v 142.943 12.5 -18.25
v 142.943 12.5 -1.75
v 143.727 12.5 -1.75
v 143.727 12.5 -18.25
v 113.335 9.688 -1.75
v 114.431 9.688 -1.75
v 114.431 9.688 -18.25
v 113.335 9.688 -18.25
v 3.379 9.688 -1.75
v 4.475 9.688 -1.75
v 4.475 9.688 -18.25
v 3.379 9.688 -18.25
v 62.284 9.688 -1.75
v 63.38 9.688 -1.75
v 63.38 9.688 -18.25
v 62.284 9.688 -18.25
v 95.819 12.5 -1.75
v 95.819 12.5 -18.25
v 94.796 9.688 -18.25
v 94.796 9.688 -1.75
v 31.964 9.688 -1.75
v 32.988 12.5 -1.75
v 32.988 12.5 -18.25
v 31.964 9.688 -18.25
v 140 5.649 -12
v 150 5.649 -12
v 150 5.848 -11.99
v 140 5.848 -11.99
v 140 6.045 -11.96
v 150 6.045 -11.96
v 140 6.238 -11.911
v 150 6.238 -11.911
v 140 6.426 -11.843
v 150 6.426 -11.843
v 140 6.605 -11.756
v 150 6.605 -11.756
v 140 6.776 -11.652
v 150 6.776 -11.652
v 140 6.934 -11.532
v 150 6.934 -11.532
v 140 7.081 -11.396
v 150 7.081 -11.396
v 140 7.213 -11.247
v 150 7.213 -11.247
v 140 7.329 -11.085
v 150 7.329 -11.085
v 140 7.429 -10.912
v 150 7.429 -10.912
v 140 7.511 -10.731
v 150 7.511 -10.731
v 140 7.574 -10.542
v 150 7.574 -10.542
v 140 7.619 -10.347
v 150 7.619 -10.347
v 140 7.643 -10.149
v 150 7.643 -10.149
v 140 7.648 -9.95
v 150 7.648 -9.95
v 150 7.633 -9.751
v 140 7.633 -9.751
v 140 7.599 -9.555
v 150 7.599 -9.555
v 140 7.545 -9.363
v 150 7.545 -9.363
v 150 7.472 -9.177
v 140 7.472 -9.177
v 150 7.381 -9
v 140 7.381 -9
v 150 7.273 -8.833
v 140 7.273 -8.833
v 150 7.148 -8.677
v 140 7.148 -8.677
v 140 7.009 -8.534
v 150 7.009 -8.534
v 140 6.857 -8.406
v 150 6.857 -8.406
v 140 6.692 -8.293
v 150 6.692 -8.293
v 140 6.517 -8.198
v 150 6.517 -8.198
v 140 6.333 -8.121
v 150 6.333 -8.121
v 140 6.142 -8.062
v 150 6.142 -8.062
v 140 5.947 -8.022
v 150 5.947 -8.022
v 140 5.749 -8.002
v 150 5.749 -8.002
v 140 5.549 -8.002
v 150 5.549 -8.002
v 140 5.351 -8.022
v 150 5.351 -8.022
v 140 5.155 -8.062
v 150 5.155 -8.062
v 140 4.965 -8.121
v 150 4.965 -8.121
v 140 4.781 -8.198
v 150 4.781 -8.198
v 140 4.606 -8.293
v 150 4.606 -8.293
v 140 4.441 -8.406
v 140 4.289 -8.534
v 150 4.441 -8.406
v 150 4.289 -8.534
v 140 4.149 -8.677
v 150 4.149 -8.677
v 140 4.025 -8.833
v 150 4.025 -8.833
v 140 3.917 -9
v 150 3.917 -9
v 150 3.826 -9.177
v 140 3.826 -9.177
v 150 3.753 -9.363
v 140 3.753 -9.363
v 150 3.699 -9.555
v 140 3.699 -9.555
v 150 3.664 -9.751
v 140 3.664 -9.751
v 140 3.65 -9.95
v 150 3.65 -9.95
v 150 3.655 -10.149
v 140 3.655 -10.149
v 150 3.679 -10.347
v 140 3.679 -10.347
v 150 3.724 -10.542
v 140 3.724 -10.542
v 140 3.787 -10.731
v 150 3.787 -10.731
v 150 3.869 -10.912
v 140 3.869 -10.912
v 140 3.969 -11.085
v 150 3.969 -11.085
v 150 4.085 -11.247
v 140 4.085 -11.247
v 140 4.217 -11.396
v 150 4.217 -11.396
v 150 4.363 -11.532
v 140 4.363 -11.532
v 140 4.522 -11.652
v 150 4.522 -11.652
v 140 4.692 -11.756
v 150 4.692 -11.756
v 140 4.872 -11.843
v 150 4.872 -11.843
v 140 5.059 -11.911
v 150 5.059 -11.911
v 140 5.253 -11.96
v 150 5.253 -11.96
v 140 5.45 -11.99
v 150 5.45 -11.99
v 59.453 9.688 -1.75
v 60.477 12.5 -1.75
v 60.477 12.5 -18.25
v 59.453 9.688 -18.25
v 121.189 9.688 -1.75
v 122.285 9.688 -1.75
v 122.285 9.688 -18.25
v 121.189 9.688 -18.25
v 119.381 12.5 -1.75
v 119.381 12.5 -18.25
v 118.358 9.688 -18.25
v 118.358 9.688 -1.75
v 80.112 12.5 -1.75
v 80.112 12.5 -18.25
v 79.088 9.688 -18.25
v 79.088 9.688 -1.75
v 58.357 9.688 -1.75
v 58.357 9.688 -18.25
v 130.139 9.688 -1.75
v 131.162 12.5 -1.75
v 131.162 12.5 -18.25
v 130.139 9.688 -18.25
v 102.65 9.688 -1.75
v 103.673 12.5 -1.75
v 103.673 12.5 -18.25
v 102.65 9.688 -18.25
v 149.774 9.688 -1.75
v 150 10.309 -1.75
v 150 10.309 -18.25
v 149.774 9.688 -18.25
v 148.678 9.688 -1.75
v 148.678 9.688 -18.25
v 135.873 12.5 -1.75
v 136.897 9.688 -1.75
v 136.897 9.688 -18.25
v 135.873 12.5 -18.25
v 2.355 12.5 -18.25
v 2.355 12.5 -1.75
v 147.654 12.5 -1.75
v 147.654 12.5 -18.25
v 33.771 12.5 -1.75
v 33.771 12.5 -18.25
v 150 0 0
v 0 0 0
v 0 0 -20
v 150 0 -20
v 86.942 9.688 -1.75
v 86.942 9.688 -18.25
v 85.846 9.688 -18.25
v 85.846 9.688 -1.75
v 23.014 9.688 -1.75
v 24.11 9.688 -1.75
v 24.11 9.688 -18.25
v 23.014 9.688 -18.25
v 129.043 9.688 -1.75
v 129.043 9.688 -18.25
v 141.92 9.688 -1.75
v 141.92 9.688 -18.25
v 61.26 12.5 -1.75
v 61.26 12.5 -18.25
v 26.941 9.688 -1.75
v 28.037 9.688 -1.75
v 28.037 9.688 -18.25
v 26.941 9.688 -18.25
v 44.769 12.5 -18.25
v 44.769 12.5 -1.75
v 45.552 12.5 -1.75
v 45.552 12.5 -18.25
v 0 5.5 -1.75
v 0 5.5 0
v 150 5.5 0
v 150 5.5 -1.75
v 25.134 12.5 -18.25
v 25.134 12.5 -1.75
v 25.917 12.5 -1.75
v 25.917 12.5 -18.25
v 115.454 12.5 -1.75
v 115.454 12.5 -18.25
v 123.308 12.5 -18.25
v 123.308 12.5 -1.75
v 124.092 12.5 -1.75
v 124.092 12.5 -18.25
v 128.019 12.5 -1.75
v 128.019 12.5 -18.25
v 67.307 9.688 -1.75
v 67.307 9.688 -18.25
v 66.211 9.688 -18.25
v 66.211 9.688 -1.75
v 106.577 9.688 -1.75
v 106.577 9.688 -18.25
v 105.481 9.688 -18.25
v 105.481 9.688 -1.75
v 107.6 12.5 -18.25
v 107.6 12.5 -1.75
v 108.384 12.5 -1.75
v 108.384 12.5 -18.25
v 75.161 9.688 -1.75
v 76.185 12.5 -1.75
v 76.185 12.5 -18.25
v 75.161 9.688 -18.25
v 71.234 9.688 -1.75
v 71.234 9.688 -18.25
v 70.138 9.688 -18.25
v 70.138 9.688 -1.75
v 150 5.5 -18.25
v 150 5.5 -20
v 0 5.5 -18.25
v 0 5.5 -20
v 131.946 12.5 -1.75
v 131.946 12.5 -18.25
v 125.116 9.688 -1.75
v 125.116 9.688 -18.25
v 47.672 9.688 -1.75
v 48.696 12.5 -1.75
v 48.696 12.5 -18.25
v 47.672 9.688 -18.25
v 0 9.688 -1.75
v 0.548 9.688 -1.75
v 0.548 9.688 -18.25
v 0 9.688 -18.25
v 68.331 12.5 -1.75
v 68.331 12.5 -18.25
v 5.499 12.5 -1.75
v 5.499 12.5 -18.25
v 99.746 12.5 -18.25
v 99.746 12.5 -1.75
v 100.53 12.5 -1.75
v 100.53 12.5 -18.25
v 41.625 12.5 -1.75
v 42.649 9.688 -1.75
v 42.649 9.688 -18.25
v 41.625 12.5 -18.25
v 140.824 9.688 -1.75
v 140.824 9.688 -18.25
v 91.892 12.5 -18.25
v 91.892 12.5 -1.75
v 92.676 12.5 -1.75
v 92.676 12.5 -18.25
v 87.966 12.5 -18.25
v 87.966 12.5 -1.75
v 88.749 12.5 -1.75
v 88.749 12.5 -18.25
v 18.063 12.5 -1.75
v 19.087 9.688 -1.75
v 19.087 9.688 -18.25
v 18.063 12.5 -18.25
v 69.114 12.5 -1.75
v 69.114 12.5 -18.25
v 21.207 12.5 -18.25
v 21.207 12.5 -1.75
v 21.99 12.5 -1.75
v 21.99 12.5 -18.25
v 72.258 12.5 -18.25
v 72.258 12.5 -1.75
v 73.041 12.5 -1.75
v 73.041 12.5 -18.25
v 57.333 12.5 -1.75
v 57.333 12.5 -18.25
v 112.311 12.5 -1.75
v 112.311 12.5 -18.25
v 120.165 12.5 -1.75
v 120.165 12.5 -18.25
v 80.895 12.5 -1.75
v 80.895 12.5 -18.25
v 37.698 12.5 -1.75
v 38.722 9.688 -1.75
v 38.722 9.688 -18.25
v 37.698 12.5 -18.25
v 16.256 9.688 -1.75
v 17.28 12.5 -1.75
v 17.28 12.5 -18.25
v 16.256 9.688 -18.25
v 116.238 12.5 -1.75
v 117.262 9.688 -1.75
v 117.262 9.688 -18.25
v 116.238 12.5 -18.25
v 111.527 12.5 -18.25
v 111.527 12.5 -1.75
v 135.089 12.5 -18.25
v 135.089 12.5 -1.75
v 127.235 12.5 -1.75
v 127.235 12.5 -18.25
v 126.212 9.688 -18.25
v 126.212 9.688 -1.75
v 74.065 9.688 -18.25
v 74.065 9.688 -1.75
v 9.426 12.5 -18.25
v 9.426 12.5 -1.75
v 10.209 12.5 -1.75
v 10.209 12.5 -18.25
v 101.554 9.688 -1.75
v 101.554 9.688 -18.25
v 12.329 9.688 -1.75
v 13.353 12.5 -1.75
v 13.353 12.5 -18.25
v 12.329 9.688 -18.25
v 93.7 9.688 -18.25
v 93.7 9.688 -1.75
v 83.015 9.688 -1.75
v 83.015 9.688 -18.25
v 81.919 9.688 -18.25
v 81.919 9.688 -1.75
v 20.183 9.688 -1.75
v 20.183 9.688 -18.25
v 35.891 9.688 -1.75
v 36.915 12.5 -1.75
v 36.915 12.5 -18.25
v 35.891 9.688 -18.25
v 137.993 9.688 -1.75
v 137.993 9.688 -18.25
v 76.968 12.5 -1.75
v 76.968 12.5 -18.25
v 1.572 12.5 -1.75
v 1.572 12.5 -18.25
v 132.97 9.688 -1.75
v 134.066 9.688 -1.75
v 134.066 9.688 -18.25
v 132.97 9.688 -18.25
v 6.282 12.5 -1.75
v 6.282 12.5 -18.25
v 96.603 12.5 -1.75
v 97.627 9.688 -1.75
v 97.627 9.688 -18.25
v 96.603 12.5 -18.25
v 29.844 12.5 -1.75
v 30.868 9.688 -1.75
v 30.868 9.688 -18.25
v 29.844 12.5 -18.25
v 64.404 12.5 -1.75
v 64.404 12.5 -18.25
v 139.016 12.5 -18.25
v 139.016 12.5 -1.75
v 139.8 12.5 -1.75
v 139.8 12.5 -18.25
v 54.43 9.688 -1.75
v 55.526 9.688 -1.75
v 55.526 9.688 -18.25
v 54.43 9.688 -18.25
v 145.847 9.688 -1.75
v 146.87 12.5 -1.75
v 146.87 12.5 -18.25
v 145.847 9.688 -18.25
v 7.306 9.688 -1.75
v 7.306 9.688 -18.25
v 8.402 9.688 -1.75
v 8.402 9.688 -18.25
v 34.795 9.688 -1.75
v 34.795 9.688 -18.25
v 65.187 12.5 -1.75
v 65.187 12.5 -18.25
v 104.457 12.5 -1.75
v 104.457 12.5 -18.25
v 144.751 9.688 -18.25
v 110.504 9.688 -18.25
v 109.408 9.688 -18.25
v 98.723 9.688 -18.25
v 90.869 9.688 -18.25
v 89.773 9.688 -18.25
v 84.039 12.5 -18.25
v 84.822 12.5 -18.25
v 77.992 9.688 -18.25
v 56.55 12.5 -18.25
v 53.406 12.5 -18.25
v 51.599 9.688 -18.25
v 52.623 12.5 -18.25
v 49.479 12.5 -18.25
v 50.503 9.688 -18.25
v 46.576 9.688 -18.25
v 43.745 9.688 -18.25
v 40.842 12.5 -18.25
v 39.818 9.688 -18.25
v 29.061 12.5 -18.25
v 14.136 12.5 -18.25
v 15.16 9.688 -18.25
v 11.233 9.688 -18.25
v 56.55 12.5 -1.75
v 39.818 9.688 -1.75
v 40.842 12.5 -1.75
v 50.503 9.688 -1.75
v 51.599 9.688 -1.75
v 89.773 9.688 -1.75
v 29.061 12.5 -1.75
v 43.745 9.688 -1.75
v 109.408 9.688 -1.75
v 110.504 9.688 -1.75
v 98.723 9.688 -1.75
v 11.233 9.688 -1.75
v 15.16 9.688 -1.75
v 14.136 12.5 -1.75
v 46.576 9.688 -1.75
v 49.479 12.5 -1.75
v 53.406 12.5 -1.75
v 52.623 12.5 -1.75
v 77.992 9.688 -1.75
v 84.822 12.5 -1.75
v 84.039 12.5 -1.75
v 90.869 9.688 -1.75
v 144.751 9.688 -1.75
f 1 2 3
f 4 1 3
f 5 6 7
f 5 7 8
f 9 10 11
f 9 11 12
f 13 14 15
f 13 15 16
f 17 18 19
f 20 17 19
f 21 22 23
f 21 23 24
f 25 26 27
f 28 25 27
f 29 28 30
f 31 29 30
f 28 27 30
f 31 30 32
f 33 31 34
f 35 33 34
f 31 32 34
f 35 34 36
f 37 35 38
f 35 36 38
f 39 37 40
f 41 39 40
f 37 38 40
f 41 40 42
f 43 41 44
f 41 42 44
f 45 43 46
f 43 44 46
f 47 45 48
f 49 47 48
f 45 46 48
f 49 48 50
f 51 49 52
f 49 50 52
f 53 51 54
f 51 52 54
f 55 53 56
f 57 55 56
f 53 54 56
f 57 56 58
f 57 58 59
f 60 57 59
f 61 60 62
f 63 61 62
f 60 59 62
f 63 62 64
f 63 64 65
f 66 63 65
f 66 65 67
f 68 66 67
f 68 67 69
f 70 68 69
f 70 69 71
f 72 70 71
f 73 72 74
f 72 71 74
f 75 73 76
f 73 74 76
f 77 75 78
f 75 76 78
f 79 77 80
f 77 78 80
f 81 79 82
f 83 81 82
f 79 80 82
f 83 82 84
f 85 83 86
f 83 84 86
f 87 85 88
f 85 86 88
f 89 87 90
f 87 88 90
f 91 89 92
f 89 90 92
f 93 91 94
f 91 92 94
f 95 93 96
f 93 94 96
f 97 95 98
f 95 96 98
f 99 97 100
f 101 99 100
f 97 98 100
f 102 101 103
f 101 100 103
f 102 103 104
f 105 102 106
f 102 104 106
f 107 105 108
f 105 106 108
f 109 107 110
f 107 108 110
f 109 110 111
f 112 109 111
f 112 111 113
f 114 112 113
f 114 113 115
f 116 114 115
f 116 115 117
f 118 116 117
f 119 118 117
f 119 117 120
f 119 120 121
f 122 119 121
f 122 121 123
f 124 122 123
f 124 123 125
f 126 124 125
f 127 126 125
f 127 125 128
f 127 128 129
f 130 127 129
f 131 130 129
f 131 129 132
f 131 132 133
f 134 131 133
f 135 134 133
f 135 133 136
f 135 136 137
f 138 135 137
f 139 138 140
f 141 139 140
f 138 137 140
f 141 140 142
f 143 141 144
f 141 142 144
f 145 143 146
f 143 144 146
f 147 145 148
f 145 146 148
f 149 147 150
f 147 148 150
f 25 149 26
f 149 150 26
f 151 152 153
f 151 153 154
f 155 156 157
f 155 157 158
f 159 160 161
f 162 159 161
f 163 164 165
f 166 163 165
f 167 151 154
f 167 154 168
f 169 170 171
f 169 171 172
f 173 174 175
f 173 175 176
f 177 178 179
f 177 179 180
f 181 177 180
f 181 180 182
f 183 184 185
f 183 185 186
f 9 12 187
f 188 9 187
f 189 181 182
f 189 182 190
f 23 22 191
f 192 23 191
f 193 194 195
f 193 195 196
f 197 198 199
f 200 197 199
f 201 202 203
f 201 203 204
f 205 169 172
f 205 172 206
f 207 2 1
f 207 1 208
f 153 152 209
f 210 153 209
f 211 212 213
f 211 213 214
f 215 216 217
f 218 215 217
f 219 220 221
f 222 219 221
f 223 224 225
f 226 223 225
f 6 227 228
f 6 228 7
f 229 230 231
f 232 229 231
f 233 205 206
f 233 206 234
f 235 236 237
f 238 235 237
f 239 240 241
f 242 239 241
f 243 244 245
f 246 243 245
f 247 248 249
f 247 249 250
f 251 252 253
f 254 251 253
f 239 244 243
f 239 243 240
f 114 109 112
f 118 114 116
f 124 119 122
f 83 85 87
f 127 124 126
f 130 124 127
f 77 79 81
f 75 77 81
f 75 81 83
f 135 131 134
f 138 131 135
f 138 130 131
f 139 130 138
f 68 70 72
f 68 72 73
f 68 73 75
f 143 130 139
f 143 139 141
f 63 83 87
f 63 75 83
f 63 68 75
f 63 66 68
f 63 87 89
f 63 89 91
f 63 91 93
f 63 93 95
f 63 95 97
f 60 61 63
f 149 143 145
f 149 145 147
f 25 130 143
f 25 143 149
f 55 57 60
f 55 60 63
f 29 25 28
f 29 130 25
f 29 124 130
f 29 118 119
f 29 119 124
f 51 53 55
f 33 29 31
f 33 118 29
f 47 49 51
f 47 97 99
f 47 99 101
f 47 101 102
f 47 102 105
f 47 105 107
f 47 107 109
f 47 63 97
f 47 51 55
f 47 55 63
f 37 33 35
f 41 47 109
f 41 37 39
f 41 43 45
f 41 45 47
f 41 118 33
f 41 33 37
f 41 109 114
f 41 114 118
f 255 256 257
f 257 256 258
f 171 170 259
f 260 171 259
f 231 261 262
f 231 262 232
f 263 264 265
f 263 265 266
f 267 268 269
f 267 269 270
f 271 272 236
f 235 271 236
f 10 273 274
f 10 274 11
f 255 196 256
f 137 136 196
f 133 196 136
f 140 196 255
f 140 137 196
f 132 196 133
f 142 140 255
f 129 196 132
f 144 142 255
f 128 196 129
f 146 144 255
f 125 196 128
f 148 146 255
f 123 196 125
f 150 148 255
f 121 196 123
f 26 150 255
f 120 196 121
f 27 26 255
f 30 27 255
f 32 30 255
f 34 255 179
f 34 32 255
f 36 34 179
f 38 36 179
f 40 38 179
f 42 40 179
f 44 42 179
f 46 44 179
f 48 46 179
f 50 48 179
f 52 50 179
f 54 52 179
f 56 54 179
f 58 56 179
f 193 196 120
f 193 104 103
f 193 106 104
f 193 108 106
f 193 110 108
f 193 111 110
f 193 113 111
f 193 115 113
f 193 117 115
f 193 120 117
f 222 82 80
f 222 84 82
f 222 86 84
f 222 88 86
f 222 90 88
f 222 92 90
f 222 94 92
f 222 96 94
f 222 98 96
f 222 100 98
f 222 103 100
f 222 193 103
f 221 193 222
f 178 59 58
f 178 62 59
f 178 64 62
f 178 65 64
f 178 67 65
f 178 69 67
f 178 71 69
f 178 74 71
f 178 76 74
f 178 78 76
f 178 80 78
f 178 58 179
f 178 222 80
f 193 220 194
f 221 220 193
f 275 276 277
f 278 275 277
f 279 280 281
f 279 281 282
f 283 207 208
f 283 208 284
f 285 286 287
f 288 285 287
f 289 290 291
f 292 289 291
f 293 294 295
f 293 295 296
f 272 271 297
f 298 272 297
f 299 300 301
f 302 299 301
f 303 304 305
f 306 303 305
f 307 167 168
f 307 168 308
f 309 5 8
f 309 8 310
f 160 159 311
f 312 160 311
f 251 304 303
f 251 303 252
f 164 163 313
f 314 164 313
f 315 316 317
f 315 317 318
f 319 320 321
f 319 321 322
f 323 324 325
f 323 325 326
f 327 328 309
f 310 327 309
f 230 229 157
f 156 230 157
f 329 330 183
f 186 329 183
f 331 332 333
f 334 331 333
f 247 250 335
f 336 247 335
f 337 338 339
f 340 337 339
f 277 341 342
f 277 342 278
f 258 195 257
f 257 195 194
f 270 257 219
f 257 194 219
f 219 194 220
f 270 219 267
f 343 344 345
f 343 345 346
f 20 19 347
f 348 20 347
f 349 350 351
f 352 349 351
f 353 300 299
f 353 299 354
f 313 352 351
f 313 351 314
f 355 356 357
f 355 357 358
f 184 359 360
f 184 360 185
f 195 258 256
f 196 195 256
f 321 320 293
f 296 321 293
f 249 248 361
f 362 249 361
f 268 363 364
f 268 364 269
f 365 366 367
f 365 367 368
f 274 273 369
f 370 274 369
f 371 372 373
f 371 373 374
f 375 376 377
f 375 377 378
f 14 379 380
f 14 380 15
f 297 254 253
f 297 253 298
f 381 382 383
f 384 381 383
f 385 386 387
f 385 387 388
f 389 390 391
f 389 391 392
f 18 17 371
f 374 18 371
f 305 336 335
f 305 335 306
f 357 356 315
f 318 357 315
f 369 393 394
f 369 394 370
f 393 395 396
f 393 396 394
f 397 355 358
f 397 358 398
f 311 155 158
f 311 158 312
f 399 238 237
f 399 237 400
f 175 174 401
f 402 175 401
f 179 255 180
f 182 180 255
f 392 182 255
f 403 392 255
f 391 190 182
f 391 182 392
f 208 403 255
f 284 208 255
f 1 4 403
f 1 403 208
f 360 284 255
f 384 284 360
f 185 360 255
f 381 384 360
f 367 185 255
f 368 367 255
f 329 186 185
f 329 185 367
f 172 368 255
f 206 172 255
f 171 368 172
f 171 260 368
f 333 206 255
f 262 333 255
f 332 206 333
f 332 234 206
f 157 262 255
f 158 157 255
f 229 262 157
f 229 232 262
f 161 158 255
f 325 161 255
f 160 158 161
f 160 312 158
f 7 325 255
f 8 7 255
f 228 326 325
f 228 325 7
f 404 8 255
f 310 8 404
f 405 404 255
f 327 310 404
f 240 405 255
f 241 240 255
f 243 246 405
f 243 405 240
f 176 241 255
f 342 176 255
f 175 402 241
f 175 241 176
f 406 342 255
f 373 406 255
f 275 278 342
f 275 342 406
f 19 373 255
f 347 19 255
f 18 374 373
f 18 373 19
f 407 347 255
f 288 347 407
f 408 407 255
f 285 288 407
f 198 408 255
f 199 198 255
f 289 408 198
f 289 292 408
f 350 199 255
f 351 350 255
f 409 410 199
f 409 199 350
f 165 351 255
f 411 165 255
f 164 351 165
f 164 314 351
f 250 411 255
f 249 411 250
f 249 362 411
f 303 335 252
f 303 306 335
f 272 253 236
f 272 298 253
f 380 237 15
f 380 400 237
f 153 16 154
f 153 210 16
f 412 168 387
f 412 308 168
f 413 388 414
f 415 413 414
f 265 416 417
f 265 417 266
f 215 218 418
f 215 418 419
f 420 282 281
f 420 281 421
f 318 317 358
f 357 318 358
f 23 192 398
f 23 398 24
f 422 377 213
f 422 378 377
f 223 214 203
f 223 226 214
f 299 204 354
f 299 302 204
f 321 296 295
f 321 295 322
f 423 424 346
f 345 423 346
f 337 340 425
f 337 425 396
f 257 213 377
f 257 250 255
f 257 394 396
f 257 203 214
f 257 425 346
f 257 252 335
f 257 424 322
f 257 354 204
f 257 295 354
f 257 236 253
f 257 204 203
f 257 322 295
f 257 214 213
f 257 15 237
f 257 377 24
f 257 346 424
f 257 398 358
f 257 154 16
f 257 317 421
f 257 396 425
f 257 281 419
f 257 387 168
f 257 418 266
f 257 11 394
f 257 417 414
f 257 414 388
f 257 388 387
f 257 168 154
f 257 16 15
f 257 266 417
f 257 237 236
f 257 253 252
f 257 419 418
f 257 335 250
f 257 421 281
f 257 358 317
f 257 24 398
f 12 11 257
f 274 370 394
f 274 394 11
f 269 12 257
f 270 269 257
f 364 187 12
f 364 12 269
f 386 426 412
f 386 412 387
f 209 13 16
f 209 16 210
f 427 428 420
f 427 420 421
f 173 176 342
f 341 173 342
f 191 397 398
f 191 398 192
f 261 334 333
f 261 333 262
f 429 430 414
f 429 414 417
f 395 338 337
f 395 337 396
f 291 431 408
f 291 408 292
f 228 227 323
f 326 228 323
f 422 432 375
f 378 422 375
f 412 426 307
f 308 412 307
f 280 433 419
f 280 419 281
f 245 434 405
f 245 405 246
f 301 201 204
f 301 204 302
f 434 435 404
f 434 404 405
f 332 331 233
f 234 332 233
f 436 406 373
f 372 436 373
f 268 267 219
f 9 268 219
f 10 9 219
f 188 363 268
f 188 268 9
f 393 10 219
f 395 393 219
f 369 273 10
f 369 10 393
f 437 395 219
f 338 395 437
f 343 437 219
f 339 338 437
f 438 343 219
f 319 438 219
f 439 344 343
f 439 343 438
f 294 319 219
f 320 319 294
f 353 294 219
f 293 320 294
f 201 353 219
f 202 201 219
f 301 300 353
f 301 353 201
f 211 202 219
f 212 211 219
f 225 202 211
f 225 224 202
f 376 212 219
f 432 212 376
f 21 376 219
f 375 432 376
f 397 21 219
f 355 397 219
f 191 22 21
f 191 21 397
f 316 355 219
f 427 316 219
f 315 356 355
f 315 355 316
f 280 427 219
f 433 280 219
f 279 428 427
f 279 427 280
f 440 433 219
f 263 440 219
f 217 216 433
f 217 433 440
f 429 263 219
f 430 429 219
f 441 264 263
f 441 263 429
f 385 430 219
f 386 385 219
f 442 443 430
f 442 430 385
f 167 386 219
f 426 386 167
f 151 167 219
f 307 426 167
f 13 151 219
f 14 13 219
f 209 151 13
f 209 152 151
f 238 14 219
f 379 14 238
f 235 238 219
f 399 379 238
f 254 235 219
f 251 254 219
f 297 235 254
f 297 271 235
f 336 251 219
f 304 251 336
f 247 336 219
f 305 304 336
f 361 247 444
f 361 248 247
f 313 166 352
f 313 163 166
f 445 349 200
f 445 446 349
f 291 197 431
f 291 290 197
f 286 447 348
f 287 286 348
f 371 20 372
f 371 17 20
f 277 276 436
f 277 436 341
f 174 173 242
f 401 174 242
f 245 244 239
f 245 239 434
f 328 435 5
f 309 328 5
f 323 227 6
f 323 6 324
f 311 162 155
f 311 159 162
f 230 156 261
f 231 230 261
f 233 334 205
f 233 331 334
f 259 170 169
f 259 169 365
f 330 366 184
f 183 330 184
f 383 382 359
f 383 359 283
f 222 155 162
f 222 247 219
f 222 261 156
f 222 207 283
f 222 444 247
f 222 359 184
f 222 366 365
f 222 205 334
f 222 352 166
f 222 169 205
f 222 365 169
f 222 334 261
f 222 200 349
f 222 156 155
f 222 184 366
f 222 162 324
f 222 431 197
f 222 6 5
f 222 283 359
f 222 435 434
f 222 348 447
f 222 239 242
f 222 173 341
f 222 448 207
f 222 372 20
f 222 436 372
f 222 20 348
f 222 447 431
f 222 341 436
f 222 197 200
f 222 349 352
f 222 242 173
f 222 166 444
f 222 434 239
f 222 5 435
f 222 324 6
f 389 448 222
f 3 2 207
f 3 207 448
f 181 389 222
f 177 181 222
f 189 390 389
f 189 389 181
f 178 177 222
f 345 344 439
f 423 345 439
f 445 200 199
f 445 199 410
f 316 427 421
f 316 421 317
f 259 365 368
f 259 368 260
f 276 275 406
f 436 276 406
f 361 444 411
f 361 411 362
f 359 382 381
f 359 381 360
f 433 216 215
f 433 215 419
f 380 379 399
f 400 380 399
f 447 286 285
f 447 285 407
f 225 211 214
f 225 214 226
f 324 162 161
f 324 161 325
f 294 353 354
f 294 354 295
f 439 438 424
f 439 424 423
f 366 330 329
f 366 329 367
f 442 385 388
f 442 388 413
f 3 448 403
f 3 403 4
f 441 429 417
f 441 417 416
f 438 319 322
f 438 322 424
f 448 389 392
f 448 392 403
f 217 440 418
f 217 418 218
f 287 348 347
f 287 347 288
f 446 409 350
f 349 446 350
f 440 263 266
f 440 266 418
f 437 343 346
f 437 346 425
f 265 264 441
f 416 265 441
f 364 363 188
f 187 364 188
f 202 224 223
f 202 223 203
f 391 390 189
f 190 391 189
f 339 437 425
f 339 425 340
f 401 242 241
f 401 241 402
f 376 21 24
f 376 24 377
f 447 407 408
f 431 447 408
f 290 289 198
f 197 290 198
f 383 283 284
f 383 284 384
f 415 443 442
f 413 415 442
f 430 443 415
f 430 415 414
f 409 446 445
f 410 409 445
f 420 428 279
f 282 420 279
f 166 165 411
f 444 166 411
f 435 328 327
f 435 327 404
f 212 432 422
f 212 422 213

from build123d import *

# Parameters (mm, degrees)
BLANKSKE_W            = 150
BLANKSKE_H            = 12.5
BLANK_DEPTH           = 20
TOOTHCUTSIM_DEPTH     = 152.842846391
TEETHCUTS_COUNT       = 39
TEETHCUTS_PITCH       = 3.926990813
CROQUIS3_W            = 150.577281711
CROQUIS3_H            = 7.352719699
CORTAR_EXTRUIR1_DEPTH = 1.75
CROQUIS4_W            = 150
CROQUIS4_H            = 8.901496228
CORTAR_EXTRUIR2_DEPTH = 1.75
CROQUIS5_R            = 2
CORTAR_EXTRUIR3_DEPTH = 10


with BuildPart() as part:
    # BlankSke → Blank (new body)
    with BuildSketch(Plane.XY):
        with Locations((75, 6.25)):
            Rectangle(BLANKSKE_W, BLANKSKE_H)
    extrude(amount=-BLANK_DEPTH)

    # TooCutSkeSim → ToothCutSim (cut, through all)
    with BuildSketch(Plane.XY):
        Polygon((0.548044212, 9.6875), (-0.548044212, 9.6875), (-1.58095534, 12.5254), (1.58095534, 12.5254), align=None)
    toothcutsim = extrude(amount=-TOOTHCUTSIM_DEPTH, mode=Mode.SUBTRACT)

    # TeethCuts: ToothCutSim ×39
    with Locations(*[(i * TEETHCUTS_PITCH, 0, 0) for i in range(1, TEETHCUTS_COUNT)]):
        add(toothcutsim, mode=Mode.SUBTRACT)

    # Croquis3 → Cortar-Extruir1 (cut)
    with BuildSketch(Plane.XY):
        with Locations((75.288640856, 9.17635985)):
            Rectangle(CROQUIS3_W, CROQUIS3_H)
    extrude(amount=-CORTAR_EXTRUIR1_DEPTH, mode=Mode.SUBTRACT)

    # Croquis4 → Cortar-Extruir2 (cut)
    with BuildSketch(Plane(origin=(0, 0, -20), x_dir=(-1, 0, 0), z_dir=(0, 0, -1))):
        with Locations((-75, 9.950748114)):
            Rectangle(CROQUIS4_W, CROQUIS4_H)
    extrude(amount=-CORTAR_EXTRUIR2_DEPTH, mode=Mode.SUBTRACT)

    # Croquis5 → Cortar-Extruir3 (cut)
    with BuildSketch(Plane(origin=(150, 0, 0), x_dir=(0, 0, -1), z_dir=(1, 0, 0))):
        with Locations((10, 5.648913774)):
            Circle(CROQUIS5_R)
    extrude(amount=-CORTAR_EXTRUIR3_DEPTH, mode=Mode.SUBTRACT)


solid = part.part
